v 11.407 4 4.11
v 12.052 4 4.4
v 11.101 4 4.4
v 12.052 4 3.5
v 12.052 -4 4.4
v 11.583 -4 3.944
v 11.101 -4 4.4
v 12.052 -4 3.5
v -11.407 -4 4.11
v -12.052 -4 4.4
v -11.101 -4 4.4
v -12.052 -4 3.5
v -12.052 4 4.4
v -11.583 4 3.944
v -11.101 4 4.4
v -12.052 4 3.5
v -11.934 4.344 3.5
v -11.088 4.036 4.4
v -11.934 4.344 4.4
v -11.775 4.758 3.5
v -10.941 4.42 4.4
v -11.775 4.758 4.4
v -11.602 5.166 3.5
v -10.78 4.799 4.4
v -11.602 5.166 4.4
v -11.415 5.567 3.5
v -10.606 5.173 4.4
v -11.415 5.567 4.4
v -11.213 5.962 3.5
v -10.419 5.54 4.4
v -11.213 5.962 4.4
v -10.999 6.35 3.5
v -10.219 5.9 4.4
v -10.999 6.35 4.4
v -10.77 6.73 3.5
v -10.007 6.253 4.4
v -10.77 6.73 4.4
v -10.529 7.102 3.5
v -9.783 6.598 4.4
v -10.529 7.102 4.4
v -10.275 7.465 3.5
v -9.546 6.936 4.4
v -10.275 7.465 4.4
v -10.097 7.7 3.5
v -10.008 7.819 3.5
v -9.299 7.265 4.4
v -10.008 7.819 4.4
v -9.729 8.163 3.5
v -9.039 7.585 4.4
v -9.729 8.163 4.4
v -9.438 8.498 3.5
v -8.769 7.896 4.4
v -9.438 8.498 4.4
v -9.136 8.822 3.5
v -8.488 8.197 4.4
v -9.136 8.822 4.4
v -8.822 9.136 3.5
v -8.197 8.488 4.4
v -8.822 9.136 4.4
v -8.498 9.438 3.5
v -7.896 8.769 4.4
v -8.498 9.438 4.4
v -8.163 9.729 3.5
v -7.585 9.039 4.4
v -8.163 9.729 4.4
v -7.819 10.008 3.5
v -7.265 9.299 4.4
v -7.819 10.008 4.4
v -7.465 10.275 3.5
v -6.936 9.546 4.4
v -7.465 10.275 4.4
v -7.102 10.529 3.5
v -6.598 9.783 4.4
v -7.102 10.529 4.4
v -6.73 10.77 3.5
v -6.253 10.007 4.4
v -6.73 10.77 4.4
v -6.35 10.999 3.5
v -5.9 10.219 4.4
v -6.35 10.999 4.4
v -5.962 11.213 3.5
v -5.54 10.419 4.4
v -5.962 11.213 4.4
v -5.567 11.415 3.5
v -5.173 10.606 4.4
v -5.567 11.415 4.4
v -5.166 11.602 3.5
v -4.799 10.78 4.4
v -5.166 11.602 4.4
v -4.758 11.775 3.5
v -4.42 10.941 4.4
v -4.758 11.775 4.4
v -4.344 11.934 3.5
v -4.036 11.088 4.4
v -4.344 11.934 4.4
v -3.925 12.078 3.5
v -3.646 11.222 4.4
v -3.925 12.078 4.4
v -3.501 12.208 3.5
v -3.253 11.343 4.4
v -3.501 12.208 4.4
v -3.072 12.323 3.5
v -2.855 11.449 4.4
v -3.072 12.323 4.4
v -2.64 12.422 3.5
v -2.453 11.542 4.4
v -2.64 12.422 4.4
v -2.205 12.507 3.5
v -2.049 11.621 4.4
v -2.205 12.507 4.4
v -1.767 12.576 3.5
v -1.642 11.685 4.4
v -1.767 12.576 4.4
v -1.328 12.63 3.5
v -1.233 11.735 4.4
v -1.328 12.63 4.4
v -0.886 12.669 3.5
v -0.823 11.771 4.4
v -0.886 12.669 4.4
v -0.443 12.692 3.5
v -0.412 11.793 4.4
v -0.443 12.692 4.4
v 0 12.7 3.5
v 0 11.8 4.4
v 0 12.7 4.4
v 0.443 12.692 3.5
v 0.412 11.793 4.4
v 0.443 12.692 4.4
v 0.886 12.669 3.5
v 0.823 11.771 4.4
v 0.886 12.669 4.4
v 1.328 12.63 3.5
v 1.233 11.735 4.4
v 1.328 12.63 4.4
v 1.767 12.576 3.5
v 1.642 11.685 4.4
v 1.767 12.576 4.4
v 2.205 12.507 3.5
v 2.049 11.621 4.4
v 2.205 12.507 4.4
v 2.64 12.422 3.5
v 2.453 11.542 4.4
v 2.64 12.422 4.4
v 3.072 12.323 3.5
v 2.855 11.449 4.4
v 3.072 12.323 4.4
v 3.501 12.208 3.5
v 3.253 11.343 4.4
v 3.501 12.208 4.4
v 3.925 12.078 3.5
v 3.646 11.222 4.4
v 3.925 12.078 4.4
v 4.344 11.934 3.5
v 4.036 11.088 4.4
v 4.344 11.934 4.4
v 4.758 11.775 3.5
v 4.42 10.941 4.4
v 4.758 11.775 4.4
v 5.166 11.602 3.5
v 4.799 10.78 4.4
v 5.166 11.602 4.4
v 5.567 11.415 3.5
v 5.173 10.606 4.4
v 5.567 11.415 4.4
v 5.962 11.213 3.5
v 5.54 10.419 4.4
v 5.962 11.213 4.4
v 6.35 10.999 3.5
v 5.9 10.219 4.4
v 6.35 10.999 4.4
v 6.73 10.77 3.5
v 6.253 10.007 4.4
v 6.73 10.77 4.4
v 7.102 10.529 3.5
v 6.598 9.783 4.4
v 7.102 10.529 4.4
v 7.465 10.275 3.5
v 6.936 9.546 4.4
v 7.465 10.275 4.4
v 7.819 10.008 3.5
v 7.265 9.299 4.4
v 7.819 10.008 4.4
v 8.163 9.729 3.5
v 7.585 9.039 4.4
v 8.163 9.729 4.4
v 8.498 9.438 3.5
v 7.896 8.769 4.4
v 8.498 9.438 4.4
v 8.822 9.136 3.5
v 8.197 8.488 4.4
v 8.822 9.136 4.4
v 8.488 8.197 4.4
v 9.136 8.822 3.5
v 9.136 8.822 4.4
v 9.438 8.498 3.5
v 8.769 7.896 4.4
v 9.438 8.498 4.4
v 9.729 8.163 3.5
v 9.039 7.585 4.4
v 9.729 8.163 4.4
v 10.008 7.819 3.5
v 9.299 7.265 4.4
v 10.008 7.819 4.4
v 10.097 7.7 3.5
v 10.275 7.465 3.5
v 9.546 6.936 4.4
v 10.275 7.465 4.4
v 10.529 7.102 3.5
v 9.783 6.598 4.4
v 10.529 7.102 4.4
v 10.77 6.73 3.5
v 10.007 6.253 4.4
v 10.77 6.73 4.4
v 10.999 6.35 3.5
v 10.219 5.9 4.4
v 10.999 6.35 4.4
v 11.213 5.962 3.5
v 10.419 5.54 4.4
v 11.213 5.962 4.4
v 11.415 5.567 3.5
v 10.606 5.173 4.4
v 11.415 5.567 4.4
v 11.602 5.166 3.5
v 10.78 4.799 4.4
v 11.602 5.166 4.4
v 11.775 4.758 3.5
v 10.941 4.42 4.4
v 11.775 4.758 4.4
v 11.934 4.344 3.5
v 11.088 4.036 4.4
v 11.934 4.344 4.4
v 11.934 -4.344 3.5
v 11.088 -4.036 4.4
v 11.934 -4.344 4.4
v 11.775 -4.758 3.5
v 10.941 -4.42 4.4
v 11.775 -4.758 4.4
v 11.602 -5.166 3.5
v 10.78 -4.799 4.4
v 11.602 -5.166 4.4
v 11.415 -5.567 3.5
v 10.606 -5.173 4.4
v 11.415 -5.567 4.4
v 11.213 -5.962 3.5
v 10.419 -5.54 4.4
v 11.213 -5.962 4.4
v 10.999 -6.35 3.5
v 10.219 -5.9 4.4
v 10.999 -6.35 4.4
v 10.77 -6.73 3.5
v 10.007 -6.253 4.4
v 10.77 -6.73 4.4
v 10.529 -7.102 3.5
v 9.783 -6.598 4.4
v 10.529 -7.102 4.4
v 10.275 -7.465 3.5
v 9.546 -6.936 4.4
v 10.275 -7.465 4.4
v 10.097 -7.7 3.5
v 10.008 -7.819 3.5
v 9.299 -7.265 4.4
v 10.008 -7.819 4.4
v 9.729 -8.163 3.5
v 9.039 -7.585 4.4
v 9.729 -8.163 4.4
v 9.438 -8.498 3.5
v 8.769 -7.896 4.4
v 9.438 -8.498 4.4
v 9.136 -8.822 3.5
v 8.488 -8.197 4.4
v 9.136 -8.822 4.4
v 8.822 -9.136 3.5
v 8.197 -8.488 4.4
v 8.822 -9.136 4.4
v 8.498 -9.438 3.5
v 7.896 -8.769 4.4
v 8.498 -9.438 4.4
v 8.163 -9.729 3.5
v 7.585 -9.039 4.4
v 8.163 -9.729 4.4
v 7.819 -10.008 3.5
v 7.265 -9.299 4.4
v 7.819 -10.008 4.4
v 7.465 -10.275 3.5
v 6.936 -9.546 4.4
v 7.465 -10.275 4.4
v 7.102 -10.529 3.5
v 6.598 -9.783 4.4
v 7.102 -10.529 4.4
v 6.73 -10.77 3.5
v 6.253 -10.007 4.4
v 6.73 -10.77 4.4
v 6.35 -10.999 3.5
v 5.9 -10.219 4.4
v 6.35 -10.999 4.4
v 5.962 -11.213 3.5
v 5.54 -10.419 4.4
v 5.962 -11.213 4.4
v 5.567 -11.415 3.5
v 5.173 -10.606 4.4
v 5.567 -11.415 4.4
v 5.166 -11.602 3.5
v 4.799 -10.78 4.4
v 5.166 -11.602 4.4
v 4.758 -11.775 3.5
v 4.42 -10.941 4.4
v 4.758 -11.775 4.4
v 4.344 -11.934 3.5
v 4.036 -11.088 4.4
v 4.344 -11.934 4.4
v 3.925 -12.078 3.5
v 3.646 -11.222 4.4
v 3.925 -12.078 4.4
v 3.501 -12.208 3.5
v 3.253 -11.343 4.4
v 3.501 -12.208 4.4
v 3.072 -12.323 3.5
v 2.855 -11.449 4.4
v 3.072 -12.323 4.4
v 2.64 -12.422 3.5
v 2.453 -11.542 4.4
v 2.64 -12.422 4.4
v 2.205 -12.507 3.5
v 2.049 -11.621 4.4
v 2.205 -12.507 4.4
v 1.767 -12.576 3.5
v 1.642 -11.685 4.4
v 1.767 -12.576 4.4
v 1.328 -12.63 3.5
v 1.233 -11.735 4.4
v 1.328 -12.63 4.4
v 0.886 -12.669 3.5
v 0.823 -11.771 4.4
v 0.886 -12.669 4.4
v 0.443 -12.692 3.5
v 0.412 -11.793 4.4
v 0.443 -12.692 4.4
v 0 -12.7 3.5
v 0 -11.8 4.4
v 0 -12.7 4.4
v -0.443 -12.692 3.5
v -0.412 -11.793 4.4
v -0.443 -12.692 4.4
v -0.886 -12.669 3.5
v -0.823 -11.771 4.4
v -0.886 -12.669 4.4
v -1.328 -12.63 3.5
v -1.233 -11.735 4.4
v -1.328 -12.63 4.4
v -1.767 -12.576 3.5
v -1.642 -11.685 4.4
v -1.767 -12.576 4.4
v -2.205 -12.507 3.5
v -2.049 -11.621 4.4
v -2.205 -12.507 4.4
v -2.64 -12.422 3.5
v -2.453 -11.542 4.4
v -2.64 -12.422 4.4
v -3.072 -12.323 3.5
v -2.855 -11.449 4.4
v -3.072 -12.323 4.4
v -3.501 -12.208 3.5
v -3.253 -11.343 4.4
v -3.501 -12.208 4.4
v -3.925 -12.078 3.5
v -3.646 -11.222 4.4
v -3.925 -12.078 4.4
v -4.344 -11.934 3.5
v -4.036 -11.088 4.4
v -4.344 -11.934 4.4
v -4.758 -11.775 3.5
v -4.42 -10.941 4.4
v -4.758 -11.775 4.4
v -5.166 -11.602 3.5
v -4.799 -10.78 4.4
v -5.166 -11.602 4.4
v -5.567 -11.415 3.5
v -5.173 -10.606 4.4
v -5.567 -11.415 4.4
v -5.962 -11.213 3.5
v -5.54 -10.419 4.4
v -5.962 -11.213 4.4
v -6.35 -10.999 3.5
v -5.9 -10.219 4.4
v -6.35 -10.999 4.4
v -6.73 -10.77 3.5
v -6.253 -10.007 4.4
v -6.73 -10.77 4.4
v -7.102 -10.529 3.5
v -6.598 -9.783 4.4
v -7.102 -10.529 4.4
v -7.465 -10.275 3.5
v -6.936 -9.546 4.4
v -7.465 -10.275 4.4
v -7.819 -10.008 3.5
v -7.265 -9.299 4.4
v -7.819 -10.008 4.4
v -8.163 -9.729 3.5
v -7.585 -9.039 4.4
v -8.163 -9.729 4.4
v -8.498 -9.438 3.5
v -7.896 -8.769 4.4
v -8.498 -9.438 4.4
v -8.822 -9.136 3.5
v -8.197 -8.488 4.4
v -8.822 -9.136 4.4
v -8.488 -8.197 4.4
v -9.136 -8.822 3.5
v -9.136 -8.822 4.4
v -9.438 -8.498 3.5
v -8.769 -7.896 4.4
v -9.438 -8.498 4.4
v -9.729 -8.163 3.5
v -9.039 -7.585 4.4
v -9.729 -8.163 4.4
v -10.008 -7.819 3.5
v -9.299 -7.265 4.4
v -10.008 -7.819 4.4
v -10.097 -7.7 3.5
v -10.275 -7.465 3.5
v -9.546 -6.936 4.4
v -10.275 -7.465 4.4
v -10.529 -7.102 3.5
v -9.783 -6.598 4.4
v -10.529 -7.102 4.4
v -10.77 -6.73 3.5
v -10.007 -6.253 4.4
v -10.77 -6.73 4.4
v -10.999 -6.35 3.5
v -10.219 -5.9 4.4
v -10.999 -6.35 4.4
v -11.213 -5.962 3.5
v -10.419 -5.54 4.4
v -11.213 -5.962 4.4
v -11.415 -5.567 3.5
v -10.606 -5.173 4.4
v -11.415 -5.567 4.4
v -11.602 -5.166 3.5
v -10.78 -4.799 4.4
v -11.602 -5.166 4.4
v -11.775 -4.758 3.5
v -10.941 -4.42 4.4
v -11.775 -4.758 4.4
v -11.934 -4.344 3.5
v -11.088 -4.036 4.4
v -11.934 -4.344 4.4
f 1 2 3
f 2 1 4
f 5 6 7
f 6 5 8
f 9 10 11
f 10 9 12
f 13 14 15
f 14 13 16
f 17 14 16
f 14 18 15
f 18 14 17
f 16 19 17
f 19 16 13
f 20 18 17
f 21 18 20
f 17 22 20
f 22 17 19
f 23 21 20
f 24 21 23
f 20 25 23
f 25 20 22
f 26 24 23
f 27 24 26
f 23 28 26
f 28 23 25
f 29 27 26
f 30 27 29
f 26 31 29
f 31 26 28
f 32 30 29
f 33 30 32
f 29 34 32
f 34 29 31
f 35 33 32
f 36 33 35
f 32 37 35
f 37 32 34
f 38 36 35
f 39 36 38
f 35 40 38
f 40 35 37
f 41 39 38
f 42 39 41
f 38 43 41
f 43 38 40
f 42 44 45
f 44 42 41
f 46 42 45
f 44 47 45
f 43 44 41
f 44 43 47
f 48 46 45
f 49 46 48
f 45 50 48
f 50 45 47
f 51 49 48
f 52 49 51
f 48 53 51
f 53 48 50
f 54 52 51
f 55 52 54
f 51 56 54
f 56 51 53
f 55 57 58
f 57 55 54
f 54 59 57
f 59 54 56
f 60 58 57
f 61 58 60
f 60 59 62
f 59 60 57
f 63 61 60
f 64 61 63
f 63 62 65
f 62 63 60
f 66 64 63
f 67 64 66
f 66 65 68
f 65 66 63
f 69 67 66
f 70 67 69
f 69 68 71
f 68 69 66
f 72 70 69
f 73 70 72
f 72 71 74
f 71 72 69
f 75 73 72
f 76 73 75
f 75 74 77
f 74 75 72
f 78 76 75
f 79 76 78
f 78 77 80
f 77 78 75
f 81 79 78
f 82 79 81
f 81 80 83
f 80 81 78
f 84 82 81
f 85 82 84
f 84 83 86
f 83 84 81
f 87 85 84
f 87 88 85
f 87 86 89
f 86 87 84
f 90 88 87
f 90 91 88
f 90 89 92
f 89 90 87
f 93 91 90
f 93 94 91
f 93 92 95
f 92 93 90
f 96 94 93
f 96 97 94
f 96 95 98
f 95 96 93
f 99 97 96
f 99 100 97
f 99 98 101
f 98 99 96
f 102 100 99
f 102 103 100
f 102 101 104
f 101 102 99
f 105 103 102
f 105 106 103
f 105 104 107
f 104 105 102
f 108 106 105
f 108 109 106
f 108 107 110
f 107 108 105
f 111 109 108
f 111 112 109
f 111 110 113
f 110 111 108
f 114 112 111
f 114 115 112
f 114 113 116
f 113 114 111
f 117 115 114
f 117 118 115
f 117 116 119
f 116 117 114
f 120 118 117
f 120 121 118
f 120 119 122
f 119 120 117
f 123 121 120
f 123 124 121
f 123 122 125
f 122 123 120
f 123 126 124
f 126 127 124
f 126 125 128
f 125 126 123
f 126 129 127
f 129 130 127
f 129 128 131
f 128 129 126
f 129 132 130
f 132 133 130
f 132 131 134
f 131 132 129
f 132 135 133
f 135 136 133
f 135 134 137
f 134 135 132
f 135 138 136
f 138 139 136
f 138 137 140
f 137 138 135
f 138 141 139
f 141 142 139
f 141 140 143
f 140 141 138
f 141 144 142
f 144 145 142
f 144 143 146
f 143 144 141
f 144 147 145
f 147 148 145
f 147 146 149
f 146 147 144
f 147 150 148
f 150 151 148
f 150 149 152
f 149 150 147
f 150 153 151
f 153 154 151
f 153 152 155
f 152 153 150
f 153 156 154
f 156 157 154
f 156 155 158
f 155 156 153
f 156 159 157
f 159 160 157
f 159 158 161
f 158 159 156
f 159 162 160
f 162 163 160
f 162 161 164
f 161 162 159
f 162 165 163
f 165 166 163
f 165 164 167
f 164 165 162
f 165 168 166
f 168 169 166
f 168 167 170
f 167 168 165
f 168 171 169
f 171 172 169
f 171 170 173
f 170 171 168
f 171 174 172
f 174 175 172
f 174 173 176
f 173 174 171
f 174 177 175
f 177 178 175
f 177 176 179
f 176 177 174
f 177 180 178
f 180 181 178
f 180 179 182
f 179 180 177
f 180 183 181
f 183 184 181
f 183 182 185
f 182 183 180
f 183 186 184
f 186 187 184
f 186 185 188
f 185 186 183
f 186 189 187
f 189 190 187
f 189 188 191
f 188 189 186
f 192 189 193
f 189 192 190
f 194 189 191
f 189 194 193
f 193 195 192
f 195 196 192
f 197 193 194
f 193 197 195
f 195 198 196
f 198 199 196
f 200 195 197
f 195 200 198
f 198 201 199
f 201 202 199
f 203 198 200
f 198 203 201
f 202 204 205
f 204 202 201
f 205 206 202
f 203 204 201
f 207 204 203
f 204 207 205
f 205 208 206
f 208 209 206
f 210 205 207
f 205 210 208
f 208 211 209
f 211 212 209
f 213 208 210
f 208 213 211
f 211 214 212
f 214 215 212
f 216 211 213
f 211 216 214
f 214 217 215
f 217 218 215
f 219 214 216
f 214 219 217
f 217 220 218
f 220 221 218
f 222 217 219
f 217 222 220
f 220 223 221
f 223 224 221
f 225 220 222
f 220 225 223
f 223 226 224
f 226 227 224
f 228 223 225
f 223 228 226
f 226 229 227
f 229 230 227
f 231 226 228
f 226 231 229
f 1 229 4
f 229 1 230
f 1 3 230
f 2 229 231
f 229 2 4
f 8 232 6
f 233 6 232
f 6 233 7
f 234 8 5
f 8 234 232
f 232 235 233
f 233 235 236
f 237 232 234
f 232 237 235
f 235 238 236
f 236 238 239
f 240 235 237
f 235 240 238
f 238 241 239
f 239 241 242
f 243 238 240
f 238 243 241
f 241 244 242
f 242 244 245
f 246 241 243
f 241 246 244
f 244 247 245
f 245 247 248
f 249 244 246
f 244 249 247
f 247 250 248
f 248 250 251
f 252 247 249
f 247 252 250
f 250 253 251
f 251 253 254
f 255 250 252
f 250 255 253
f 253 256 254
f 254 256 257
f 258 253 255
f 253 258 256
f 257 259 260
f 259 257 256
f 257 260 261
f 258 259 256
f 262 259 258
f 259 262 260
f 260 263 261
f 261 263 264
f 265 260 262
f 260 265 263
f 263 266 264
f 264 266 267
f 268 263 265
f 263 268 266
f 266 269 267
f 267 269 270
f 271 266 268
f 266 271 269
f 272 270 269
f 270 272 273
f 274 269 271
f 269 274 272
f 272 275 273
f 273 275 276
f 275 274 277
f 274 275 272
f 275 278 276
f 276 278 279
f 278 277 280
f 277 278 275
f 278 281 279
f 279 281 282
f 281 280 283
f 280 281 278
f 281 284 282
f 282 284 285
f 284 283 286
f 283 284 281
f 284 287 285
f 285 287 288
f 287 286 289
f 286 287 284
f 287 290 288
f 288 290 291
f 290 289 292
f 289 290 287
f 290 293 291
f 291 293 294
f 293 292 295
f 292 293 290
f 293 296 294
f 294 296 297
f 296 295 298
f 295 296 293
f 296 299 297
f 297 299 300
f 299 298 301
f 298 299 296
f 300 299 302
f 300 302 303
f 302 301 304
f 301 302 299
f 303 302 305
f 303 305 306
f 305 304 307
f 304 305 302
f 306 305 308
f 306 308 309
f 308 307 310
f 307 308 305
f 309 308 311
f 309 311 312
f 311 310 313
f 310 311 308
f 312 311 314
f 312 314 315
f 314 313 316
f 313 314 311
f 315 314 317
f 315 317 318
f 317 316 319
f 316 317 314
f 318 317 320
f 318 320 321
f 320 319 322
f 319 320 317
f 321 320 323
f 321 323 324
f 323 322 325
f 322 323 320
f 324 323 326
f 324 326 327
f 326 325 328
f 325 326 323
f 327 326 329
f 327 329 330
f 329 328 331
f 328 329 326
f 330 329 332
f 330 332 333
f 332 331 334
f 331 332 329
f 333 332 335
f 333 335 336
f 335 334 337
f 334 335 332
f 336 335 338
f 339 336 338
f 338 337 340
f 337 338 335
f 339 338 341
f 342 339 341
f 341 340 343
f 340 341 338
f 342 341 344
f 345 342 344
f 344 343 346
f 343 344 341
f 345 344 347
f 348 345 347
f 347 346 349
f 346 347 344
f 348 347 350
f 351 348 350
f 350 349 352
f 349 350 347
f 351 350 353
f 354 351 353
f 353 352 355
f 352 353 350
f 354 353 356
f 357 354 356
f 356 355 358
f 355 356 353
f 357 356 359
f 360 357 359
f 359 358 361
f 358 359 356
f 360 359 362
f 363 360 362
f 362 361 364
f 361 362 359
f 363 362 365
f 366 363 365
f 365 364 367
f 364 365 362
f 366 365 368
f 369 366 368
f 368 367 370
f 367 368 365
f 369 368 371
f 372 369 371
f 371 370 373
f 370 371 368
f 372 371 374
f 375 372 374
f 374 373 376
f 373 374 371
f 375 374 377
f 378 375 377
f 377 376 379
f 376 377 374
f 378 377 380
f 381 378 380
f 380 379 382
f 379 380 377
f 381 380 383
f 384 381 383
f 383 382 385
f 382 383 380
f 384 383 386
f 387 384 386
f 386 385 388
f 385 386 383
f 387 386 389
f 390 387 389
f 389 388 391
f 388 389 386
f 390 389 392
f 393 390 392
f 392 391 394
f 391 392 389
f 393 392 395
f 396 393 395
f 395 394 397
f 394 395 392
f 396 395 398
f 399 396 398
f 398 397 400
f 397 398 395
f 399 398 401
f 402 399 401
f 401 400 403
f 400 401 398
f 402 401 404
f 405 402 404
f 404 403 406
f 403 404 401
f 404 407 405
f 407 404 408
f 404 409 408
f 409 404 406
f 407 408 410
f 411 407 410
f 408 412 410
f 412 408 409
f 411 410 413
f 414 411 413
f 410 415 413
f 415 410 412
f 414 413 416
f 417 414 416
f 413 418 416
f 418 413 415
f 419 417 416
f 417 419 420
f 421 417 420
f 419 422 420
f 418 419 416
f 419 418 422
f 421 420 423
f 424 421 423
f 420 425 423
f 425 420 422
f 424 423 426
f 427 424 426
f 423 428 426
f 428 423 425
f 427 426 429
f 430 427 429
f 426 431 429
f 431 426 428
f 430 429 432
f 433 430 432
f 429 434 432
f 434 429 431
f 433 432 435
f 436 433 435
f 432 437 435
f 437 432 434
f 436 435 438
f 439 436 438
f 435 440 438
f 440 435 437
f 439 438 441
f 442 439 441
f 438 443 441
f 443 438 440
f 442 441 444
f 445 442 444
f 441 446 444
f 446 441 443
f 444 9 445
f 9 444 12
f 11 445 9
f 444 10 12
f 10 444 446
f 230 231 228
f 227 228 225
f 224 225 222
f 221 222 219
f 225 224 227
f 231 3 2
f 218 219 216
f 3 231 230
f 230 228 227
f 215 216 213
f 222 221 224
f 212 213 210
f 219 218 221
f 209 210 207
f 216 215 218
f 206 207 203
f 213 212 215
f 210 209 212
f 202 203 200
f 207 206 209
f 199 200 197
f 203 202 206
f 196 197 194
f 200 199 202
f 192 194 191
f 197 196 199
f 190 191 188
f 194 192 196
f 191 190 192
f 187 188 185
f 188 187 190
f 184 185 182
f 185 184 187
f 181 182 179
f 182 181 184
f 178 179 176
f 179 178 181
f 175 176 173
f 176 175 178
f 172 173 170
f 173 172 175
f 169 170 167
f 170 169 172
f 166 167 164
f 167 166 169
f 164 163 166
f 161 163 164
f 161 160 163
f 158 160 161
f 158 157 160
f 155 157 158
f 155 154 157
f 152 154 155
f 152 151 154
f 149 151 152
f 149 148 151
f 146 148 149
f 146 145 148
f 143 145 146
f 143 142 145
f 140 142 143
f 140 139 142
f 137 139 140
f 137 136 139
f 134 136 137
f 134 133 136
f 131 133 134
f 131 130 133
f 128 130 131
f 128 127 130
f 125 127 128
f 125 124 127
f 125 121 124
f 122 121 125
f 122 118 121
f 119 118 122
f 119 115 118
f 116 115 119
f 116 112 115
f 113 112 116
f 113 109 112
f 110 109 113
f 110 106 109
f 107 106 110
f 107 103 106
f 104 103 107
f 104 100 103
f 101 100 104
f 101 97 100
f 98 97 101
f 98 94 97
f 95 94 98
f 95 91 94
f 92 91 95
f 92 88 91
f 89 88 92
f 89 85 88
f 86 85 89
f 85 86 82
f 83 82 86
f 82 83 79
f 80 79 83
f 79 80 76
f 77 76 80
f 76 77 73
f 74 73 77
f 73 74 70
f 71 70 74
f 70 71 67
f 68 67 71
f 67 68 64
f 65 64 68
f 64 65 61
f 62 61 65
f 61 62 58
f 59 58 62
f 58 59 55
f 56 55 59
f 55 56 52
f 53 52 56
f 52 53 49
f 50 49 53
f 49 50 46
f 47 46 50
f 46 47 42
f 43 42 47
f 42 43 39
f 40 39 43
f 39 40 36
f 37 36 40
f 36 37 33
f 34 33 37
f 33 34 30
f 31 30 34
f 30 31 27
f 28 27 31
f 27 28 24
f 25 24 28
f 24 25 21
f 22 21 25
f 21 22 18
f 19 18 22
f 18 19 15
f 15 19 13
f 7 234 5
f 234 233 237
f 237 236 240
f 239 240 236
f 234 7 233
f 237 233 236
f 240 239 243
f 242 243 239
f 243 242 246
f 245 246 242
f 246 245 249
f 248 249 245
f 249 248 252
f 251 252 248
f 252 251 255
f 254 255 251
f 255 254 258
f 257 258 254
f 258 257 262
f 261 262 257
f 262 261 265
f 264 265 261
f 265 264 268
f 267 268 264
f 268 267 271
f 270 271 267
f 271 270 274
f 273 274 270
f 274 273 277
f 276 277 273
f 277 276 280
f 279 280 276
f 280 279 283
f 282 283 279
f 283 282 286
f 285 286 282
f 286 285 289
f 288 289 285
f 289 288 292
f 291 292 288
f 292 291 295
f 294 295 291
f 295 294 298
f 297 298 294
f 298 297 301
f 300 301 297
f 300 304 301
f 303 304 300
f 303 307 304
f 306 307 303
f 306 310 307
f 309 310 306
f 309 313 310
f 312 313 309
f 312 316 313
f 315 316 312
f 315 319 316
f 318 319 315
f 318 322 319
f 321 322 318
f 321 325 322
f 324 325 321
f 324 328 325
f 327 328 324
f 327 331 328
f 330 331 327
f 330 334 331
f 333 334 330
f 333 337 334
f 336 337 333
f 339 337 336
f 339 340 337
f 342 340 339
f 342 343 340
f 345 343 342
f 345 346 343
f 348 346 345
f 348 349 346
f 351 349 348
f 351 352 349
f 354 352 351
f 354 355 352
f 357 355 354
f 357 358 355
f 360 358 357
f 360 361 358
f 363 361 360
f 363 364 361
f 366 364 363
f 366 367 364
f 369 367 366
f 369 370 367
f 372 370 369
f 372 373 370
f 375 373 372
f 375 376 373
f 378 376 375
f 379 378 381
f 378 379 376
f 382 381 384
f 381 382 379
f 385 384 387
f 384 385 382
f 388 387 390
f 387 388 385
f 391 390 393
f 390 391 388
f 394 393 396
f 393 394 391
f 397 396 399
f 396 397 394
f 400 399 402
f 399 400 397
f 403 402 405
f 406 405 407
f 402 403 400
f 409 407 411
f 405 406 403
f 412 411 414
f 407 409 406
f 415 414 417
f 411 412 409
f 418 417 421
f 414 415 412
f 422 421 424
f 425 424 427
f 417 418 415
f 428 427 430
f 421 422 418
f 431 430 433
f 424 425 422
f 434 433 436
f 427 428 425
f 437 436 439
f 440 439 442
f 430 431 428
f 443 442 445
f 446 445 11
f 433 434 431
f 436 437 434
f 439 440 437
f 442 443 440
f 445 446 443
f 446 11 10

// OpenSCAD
// file: dim.scad
MM_TO_INCHES = 1 / 25.4;
INCHES_TO_MM = 25.4;

D_FORWARD			= 1.00 * INCHES_TO_MM;
D_AFT				= 31.4;
R_FORWARD 			= D_FORWARD / 2;
R_AFT 				= D_AFT / 2;
D_SABER_OUTER		= 37.5;

D_PORT_SCREW		= 0.5 * INCHES_TO_MM;
R_PORT_SCREW 		= D_PORT_SCREW / 2;

FACES 				= 90;
// file: ../shapes.scad
FACES   = 180;
EPSILON = 0.1;
PIN	    = 2.54;


module tube(_h, _rInner, _rOuter) {
	difference() {
		cylinder(h=_h, r=_rOuter, $fn=FACES);
		translate([0,0,-EPSILON]) {
			cylinder(h=_h + EPSILON*2, r=_rInner, $fn=FACES);
		}
	}
}

module shelf(_r0, _h, _r1) {
	rotate_extrude($fn=FACES) {
		polygon([[_r0, 0], [_r1, _h], [_r0, _h]]);
	}
}


module pinsAtTube(r, h, nX, nY, longY)
{
	OFFSET = sqrt(r * r - PIN * PIN * nX * nX / 4);

	Y = longY ? 40 : PIN * nY;

    translate([-nX * PIN / 2, OFFSET - PIN * nY, 0]) {
        cube([nX * PIN, Y, h]);
    }	
}
// main file
use <../threads.scad>
use <../shapes.scad>
include <dim.scad>

/*
	3 sections:
	TUBE_COUPLE
	SPKR_METAL
	SPKR_PLASTIC
*/

TUBE_COUPLE_H  = 3.5;
TUBE_COUPLE_D  = 25.4;
SPKR_METAL_H   = 8;
SPKR_METAL_D   = 23.6;	
SPKR_PLASTIC_H = 2.7;
SPKR_PLASTIC_D = 28;
TRAN     	   = (TUBE_COUPLE_D - SPKR_METAL_D)/2;

H_PORT              = 8;
OFFSET              = R_AFT - H_PORT;

//intersection()
{
	difference() 
	{
		union() {
			tube(TUBE_COUPLE_H + TRAN, D_AFT/2, TUBE_COUPLE_D/2);
			translate([0, 0, TUBE_COUPLE_H]) {
				shelf(TUBE_COUPLE_D	/2, TRAN, SPKR_METAL_D/2);
				translate([0, 0, TRAN]) {
					tube(SPKR_METAL_H - TRAN, D_AFT/2, SPKR_METAL_D/2);
					translate([0, 0, SPKR_METAL_H - TRAN]) {
						tube(SPKR_PLASTIC_H, D_AFT/2, SPKR_PLASTIC_D/2);
					}
				}
			}
		}
		for(r=[0:1]) {
            S = 8;
            S2 = 4;
			rotate([0,0,r*180]) {
				translate([D_AFT/2 - S, -S/2, TUBE_COUPLE_H + 2]) {
					cube(size=[S+1, S, 20], center=false);
				}
                translate([TUBE_COUPLE_D/2 - S2, -S/2, -0.1]) {
                    cube(size=[4, S, 20]);
                }
			}
		}
        for(r2=[0:1]) {
            rotate([0, 0, 90 + 180*r2]) {
                translate([OFFSET,-100,0]) {
                    cube(size=[200, 200, TUBE_COUPLE_H]);
                }
            }
        }
	}
//	cube(size=[100,100,100]);
}
